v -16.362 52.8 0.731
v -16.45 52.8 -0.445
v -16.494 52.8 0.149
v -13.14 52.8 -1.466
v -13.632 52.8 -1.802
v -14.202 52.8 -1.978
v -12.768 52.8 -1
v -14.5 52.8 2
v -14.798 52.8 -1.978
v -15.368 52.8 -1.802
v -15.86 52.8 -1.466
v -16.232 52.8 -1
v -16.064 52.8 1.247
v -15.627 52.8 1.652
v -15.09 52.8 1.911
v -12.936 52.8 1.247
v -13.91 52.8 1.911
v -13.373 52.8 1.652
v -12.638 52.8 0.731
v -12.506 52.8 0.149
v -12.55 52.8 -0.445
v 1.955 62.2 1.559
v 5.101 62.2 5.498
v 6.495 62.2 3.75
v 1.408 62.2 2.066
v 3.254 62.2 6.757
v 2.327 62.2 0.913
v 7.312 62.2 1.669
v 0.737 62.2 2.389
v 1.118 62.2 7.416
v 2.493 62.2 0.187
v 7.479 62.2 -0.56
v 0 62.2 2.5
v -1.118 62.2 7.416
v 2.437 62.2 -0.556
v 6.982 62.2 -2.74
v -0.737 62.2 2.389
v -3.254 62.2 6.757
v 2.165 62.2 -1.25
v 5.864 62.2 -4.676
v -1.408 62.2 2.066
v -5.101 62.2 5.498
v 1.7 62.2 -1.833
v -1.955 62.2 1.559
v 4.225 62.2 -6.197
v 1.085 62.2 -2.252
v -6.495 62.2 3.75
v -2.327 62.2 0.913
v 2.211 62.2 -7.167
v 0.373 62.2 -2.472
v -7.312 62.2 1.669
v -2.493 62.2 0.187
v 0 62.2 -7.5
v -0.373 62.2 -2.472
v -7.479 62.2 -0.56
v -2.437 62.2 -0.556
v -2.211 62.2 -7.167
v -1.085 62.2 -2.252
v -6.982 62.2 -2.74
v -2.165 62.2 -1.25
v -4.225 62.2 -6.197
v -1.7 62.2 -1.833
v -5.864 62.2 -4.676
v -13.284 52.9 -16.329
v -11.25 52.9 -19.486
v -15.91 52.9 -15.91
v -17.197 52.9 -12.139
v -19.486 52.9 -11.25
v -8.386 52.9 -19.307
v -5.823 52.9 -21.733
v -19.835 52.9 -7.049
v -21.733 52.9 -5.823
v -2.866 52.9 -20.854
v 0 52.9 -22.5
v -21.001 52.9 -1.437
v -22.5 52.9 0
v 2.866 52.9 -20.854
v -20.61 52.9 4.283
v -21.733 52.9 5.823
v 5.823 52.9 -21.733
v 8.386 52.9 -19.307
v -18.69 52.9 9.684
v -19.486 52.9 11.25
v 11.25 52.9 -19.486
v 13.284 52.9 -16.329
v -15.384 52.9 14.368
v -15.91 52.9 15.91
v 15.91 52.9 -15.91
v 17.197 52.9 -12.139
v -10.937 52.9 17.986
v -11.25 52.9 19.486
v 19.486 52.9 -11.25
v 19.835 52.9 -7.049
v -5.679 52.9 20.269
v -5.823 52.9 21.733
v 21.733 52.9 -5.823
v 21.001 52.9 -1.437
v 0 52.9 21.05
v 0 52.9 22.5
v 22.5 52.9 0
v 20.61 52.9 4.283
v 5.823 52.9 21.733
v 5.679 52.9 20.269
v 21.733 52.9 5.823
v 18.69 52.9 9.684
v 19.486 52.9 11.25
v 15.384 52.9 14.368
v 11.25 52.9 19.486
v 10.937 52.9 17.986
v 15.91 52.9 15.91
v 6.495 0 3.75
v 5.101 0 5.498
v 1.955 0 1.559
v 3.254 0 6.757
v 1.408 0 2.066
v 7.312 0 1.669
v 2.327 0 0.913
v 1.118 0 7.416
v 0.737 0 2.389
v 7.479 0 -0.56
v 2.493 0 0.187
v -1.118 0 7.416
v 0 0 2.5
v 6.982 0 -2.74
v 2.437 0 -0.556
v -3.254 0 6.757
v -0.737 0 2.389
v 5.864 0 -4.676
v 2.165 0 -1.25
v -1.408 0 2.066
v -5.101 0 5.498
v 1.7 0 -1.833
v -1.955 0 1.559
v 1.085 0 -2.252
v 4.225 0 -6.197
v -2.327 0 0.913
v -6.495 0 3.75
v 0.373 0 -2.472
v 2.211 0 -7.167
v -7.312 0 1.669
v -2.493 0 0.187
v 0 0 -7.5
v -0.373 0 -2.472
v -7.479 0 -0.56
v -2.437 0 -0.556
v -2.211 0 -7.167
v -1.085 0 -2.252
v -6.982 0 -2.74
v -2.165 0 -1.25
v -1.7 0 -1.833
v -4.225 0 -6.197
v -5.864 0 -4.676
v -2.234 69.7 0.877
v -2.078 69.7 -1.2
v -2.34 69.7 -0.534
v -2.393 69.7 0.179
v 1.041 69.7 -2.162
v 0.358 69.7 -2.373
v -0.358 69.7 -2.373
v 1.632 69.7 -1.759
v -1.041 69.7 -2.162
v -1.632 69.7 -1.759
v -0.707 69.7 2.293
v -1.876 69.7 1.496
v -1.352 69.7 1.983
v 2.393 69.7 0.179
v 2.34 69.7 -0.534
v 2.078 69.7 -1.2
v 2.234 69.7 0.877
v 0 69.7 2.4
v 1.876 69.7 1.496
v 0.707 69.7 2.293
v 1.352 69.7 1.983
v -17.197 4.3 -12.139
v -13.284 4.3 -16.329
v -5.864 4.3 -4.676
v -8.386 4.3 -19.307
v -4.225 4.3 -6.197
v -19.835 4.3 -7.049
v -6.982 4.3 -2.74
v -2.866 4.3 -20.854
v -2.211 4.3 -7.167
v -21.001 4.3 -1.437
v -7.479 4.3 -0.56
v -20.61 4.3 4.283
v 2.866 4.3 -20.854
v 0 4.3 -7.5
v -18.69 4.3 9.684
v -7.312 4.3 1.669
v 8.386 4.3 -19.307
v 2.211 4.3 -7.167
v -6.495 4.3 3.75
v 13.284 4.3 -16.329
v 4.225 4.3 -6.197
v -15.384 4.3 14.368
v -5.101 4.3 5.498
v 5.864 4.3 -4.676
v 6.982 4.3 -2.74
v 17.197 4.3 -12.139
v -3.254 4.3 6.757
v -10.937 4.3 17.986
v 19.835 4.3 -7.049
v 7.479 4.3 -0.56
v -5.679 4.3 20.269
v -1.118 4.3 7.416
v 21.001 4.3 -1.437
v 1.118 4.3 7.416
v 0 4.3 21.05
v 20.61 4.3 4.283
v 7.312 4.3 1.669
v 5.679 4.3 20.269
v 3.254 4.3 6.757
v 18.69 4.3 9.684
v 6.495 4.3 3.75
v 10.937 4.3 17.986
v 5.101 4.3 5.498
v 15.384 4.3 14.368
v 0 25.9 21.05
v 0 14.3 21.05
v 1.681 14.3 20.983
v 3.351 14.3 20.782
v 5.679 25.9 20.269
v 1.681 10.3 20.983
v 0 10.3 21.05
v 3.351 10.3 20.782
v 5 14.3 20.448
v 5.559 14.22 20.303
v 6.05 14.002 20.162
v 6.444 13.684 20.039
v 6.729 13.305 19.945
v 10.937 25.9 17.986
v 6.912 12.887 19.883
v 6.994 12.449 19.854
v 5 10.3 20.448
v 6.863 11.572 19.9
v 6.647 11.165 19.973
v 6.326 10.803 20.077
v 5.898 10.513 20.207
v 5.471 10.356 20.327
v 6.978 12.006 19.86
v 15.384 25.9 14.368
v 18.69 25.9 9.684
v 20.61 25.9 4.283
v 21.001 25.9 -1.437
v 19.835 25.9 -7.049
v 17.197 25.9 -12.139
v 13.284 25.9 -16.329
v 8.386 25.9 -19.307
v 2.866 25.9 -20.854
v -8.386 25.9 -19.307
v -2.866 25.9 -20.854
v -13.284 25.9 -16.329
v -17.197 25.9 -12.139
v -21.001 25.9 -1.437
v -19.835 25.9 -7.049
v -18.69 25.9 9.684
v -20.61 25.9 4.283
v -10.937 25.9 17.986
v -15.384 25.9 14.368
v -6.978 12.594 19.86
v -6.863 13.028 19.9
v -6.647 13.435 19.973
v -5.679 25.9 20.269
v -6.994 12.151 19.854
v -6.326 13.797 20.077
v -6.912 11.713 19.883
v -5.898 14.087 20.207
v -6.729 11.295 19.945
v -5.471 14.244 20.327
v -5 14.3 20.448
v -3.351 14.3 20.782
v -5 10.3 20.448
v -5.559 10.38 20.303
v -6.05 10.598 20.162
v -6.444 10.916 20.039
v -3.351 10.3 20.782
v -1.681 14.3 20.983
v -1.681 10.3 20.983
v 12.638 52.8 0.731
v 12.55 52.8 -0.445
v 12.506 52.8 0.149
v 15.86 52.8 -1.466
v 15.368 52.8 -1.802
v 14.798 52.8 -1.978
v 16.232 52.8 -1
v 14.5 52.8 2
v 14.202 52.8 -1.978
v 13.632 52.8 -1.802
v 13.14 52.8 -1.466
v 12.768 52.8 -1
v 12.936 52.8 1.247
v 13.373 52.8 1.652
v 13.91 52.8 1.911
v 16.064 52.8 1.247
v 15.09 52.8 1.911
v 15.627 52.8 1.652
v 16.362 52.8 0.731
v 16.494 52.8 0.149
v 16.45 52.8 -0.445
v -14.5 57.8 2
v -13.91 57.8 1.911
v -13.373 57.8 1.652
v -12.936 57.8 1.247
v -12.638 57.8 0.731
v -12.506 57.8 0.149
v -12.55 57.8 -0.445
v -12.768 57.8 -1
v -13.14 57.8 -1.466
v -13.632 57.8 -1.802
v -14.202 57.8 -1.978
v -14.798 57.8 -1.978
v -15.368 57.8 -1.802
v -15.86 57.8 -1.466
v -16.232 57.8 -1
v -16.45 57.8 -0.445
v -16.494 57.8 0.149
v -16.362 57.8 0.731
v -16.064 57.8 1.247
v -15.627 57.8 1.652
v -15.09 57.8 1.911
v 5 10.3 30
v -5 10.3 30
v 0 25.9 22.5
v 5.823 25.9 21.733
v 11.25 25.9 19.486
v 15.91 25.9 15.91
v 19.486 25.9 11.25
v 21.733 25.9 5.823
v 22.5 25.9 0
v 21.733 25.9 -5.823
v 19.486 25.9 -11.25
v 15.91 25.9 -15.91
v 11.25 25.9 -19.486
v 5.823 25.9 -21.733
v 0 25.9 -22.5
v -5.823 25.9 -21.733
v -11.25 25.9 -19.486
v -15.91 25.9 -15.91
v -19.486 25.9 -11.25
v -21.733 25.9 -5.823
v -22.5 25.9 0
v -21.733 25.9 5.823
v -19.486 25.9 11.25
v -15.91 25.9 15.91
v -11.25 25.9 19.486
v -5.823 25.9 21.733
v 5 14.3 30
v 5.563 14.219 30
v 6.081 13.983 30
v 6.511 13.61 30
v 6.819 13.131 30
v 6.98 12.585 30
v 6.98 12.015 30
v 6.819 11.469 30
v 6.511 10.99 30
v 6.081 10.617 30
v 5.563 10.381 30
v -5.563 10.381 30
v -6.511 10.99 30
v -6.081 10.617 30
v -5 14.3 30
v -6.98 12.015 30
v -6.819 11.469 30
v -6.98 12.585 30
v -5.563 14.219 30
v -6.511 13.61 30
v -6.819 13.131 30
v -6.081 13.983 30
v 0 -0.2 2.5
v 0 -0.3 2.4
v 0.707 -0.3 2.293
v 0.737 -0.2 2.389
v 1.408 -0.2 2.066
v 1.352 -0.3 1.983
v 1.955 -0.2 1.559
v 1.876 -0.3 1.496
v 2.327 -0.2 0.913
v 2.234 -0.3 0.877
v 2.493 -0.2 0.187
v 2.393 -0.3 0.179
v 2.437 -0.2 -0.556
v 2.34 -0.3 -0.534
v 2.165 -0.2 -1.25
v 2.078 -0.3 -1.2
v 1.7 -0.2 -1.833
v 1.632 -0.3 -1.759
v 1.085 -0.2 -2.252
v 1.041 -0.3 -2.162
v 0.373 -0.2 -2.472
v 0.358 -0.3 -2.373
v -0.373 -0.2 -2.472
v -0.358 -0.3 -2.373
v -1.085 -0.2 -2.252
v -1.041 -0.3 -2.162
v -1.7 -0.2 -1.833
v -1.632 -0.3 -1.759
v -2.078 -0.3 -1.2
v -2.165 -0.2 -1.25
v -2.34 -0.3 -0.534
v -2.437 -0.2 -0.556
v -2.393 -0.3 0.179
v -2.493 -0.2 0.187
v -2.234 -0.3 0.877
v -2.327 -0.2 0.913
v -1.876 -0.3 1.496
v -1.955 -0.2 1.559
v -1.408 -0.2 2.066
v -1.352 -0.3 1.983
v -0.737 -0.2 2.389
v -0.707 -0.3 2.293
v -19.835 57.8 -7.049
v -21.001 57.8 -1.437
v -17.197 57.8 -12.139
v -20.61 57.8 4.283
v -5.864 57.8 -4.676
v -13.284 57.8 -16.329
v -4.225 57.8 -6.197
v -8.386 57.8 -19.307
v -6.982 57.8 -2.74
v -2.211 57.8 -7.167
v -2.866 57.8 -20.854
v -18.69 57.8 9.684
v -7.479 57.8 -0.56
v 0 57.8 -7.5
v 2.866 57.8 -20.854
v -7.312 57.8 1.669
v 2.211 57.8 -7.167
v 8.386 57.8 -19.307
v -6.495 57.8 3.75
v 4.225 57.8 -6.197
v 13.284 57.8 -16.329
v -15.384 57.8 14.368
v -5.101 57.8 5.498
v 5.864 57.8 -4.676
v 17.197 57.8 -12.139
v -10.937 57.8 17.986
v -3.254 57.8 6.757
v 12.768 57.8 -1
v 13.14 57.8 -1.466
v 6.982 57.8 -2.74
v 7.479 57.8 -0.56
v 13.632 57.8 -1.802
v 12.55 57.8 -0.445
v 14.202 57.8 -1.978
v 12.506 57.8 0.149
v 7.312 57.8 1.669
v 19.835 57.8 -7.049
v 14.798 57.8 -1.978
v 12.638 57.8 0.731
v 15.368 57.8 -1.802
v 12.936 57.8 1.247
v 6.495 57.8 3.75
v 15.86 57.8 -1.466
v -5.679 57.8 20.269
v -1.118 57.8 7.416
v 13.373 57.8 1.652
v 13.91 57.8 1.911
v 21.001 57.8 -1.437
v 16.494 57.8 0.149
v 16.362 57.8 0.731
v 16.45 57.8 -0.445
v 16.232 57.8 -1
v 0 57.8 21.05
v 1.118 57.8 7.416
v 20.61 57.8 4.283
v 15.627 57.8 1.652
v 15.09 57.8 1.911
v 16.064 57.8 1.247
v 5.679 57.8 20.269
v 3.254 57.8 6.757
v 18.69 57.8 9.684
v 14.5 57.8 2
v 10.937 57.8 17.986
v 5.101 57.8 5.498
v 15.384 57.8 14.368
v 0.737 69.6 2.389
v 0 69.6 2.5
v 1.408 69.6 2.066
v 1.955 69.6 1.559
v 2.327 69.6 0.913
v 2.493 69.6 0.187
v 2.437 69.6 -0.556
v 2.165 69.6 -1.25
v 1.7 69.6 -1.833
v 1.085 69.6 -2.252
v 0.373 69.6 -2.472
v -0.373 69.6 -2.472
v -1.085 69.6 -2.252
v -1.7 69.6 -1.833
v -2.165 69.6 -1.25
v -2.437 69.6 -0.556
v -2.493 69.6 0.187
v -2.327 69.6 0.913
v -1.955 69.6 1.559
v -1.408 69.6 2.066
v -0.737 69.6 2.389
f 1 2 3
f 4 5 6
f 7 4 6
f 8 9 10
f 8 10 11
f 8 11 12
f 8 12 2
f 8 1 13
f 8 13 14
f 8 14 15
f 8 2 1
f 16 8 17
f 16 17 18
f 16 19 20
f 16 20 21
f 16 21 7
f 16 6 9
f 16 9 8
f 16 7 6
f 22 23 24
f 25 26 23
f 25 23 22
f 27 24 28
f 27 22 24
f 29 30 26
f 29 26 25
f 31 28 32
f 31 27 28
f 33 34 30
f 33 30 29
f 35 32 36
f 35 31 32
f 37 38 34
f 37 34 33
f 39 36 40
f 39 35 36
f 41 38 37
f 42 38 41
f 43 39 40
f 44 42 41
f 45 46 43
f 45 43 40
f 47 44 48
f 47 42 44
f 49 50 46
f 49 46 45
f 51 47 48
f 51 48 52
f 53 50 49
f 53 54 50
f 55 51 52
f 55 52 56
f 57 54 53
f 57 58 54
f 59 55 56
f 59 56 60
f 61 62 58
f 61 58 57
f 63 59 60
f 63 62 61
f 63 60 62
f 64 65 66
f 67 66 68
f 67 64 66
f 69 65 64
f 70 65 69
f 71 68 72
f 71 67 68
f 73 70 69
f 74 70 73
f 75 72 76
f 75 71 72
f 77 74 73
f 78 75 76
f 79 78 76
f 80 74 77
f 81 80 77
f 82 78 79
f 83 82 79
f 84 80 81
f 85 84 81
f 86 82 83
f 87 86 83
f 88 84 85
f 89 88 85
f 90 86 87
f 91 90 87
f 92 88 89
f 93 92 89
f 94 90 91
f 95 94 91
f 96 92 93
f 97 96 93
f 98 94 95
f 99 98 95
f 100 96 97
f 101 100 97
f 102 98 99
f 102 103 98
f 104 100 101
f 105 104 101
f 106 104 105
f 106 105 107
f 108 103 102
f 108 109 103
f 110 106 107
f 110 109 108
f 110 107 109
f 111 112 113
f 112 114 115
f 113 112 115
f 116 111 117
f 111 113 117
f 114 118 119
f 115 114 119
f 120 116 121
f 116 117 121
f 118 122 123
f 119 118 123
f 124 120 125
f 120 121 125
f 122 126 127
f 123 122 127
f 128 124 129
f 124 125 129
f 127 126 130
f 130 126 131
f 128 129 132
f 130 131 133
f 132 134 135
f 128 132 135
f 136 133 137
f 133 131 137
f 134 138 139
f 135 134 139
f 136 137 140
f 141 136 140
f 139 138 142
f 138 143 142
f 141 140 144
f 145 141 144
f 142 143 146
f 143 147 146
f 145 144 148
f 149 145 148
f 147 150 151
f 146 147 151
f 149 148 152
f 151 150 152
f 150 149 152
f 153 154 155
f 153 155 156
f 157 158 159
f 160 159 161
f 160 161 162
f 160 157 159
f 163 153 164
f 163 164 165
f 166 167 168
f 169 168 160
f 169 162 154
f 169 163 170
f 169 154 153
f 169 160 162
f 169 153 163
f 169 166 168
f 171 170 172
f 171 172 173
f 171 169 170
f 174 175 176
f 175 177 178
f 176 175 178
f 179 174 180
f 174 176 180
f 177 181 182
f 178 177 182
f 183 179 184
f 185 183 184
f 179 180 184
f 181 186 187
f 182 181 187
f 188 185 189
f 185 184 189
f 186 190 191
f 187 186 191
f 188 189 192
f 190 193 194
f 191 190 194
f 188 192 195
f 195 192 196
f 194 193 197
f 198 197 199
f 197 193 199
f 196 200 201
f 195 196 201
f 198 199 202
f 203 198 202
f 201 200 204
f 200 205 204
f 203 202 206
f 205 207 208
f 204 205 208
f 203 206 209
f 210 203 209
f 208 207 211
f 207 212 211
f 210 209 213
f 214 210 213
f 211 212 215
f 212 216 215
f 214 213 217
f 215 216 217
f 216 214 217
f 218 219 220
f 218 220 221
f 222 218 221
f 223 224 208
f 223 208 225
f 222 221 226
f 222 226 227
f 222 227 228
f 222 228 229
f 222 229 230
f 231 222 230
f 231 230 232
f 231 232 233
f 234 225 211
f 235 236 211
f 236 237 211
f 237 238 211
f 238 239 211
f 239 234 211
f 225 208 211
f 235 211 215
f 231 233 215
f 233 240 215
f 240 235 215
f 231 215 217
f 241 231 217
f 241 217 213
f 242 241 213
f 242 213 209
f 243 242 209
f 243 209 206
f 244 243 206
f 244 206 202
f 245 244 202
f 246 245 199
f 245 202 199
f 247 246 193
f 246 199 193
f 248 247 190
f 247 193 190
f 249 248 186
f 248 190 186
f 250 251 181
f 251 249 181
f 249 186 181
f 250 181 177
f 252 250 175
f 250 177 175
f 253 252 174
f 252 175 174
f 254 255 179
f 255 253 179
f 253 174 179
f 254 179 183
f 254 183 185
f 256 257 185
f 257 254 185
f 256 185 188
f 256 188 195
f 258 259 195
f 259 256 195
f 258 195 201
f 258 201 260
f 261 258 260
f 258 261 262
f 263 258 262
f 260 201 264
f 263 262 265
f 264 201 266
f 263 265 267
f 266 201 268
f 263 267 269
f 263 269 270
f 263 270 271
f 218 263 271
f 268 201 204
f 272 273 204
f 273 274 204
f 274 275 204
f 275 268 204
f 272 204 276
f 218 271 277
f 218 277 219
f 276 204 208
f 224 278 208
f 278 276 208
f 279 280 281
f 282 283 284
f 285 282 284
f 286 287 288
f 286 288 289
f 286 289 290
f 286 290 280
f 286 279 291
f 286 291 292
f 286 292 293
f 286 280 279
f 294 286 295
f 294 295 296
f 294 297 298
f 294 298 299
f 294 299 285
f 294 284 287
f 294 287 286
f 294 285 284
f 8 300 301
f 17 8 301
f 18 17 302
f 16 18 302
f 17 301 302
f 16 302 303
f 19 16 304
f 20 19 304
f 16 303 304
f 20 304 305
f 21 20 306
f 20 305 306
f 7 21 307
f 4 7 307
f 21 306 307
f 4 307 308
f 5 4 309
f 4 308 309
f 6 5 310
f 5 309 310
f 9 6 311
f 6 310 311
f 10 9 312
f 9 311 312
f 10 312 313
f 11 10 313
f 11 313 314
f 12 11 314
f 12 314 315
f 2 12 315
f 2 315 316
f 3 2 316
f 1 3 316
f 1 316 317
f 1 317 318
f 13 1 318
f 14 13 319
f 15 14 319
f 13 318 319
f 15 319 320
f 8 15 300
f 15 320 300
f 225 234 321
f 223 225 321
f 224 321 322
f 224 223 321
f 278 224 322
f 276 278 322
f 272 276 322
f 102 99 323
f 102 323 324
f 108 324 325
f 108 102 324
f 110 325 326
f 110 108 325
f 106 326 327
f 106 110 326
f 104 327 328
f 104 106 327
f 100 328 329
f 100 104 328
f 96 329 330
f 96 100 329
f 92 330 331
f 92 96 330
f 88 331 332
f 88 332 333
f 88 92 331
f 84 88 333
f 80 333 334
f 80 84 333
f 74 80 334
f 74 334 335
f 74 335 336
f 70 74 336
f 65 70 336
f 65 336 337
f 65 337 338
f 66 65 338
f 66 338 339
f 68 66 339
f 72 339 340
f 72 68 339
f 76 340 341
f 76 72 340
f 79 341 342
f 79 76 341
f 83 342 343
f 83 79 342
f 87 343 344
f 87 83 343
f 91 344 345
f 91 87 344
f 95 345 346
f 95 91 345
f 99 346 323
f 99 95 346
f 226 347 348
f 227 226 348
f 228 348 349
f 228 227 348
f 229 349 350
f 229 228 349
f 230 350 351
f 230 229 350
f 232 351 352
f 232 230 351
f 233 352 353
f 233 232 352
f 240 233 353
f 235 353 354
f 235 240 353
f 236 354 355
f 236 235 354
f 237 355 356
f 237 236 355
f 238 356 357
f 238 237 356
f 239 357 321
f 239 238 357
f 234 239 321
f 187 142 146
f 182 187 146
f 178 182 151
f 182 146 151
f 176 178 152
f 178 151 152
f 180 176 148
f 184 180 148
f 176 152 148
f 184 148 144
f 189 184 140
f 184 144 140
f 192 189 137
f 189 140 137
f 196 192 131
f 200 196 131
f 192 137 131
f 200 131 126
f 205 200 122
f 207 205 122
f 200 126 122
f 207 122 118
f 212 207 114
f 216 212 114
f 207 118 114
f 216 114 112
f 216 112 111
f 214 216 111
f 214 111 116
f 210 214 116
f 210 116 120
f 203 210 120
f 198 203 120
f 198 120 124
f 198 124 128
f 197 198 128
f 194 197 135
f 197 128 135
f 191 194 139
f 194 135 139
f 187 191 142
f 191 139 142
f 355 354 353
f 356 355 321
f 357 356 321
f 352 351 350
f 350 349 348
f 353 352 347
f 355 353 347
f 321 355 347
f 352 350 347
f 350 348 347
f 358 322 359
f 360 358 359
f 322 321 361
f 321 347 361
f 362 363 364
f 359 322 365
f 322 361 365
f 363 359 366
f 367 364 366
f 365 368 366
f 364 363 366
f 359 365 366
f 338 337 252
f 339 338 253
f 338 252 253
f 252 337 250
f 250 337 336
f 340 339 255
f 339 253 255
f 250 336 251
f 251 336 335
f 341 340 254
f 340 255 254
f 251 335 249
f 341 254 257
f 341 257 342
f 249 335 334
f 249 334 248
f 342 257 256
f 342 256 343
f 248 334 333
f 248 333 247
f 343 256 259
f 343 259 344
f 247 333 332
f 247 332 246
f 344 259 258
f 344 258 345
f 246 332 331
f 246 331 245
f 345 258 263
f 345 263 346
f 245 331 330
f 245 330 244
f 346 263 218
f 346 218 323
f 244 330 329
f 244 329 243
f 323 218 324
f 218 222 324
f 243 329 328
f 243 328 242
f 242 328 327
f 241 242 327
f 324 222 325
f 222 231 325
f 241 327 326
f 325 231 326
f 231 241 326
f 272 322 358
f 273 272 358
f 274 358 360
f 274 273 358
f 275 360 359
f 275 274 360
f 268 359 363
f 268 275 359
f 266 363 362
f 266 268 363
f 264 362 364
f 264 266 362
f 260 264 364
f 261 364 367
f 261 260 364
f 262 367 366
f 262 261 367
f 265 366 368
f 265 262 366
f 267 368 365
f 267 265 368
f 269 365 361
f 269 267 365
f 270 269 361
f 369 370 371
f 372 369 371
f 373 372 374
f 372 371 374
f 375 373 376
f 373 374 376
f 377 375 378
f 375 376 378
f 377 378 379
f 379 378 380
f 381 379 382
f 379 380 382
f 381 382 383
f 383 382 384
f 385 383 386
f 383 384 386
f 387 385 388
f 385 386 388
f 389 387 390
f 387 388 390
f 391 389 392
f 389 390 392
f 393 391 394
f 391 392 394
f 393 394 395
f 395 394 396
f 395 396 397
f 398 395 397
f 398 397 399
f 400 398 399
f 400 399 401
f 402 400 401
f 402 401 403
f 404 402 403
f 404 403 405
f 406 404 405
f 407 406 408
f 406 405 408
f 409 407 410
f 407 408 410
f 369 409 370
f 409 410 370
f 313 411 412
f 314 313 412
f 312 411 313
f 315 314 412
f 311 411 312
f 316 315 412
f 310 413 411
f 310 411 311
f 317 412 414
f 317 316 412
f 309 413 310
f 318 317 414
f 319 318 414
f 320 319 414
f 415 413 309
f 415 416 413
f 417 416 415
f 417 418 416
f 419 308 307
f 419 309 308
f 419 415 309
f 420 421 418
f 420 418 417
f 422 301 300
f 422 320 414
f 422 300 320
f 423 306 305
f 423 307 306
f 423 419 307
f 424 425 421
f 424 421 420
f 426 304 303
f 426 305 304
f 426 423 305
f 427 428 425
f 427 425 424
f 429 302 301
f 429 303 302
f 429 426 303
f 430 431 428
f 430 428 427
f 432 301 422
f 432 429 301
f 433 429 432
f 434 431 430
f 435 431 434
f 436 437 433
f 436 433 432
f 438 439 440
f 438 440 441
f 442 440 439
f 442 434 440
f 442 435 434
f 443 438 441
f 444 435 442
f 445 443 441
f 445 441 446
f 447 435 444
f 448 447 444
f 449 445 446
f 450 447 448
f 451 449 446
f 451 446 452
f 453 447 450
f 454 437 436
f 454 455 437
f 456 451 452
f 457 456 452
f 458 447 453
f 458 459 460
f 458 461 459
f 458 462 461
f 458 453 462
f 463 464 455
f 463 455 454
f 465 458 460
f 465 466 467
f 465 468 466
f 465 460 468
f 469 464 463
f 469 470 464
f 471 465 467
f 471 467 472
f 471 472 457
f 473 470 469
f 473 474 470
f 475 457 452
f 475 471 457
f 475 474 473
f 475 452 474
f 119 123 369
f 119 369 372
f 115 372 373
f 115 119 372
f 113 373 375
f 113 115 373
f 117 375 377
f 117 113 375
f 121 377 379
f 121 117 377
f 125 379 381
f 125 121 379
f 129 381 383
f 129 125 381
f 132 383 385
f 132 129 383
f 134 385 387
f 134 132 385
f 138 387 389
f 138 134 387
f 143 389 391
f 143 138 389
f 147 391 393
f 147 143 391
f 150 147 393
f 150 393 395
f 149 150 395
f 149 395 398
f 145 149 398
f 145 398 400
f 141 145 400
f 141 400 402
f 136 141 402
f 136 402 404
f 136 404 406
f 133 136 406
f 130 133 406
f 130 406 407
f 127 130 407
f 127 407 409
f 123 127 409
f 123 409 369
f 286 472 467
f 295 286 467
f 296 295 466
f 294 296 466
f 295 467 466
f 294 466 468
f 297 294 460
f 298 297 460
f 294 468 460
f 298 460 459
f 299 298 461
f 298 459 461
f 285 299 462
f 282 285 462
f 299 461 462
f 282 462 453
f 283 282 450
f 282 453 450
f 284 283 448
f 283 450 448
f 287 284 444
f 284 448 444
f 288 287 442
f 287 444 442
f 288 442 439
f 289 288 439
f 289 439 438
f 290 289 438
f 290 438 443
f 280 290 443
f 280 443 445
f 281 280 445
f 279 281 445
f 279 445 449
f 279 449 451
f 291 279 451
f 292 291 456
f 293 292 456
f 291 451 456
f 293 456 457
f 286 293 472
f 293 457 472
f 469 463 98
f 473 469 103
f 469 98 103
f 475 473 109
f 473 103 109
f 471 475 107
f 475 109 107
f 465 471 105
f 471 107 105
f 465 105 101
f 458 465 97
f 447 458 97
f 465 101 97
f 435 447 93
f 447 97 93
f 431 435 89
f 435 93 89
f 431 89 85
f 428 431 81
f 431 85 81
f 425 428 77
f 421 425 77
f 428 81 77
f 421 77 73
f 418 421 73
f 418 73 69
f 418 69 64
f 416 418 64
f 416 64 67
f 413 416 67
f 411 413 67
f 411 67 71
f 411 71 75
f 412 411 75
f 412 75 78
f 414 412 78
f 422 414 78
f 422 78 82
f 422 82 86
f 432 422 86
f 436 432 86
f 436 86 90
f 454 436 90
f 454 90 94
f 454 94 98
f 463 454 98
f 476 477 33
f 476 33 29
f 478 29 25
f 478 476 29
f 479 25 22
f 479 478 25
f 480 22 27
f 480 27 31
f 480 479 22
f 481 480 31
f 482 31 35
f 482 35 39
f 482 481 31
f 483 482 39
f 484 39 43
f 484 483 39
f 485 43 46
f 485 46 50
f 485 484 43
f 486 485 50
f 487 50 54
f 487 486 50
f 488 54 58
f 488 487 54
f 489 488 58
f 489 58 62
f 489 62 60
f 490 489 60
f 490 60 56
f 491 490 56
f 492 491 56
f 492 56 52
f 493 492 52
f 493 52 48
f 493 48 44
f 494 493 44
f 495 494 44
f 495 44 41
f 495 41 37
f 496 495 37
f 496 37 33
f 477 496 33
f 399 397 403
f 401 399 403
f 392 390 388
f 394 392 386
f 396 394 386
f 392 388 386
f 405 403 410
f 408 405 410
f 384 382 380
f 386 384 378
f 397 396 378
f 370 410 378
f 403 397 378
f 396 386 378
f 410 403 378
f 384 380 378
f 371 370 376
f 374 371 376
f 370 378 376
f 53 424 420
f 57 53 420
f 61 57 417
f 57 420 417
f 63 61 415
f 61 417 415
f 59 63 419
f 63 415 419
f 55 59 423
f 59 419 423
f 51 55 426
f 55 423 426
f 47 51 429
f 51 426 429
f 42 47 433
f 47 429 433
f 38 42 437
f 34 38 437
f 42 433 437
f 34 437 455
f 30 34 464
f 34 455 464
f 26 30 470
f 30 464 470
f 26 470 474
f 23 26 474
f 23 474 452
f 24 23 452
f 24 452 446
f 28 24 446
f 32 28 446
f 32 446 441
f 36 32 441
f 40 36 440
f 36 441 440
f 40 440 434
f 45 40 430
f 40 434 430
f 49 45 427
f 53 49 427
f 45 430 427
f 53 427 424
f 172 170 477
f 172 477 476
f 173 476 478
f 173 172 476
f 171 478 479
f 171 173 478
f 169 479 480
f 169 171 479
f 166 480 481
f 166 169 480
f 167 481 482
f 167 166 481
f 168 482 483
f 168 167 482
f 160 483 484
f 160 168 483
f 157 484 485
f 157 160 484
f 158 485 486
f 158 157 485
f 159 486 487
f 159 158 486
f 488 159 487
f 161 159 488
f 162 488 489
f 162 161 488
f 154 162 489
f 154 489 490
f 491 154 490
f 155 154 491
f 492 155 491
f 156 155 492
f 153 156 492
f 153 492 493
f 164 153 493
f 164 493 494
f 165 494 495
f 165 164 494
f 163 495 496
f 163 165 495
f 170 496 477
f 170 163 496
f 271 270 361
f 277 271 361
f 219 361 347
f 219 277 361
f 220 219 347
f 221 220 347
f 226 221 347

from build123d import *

# Parameters (mm, degrees)
SKETCH_1_R          = 7.5
EXTRUDE_1_DEPTH     = 4.3
SKETCH_2_R          = 21.05
EXTRUDE_2_DEPTH     = 53.5
SKETCH_3_R          = 7.5
EXTRUDE_3_DEPTH     = 4.4
SKETCH_5_R          = 22.5
EXTRUDE_5_DEPTH     = 27
SKETCH_6_R          = 2.5
EXTRUDE_6_DEPTH     = 70
SKETCH_7_R          = 2
CUT_EXTRUDE_1_DEPTH = 5
CHAMFER_1_SIZE      = 0.1
EXTRUDE_7_DEPTH     = 30


with BuildPart() as part:
    # ｽｹｯﾁ1 → ﾎﾞｽ - 押し出し1 (new body)
    with BuildSketch(Plane(origin=(0, 0, 0), x_dir=(1, 0, 0), z_dir=(0, 1, 0))):
        with Locations(Location((0, 0, 0), (0, 0, 90))):
            Circle(SKETCH_1_R)
    extrude(amount=EXTRUDE_1_DEPTH)

    # ｽｹｯﾁ2 → ﾎﾞｽ - 押し出し2 (add)
    with BuildSketch(Plane(origin=(0, 4.3, 0), x_dir=(1, 0, 0), z_dir=(0, 1, 0))):
        with Locations(Location((0, 0, 0), (0, 0, 270))):
            Circle(SKETCH_2_R)
    extrude(amount=EXTRUDE_2_DEPTH)

    # ｽｹｯﾁ3 → ﾎﾞｽ - 押し出し3 (add)
    with BuildSketch(Plane(origin=(0, 57.8, 0), x_dir=(1, 0, 0), z_dir=(0, 1, 0))):
        with Locations(Location((0, 0, 0), (0, 0, 90))):
            Circle(SKETCH_3_R)
    extrude(amount=EXTRUDE_3_DEPTH)

    # ｽｹｯﾁ5 → ﾎﾞｽ - 押し出し5 (add)
    with BuildSketch(Plane(origin=(0, 52.9, 0), x_dir=(1, 0, 0), z_dir=(0, 1, 0))):
        with Locations(Location((0, 0, 0), (0, 0, 270))):
            Circle(SKETCH_5_R)
    extrude(amount=-EXTRUDE_5_DEPTH)

    # ｽｹｯﾁ6 → ﾎﾞｽ - 押し出し6 (add)
    with BuildSketch(Plane(origin=(0, 69.7, 0), x_dir=(1, 0, 0), z_dir=(0, 1, 0))):
        with Locations(Location((0, 0, 0), (0, 0, 270))):
            Circle(SKETCH_6_R)
    extrude(amount=-EXTRUDE_6_DEPTH)

    # ｽｹｯﾁ7 → ｶｯﾄ - 押し出し1 (cut)
    with BuildSketch(Plane(origin=(0, 57.8, 0), x_dir=(1, 0, 0), z_dir=(0, 1, 0))):
        with Locations(Location((14.5, 0, 0), (0, 0, 270))):
            Circle(SKETCH_7_R)
        with Locations(Location((-14.5, 0, 0), (0, 0, 270))):
            Circle(SKETCH_7_R)
    extrude(amount=-CUT_EXTRUDE_1_DEPTH, mode=Mode.SUBTRACT)

    # 面取り1
    chamfer_1_edges = [part.edges().sort_by_distance(p)[0] for p in [
        (0, -0.3, -2.5),
        (0, 69.7, -2.5),
    ]]
    chamfer(chamfer_1_edges, length=CHAMFER_1_SIZE)

    # ｽｹｯﾁ8 → ﾎﾞｽ - 押し出し7 (add)
    with BuildSketch(Plane.XY):
        with BuildLine():
            Line((-5, 14.3), (5, 14.3))
            ThreePointArc((5, 14.3), (7, 12.3), (5, 10.3))
            Line((5, 10.3), (-5, 10.3))
            ThreePointArc((-5, 10.3), (-7, 12.3), (-5, 14.3))
        make_face()
    extrude(amount=EXTRUDE_7_DEPTH)


solid = part.part
